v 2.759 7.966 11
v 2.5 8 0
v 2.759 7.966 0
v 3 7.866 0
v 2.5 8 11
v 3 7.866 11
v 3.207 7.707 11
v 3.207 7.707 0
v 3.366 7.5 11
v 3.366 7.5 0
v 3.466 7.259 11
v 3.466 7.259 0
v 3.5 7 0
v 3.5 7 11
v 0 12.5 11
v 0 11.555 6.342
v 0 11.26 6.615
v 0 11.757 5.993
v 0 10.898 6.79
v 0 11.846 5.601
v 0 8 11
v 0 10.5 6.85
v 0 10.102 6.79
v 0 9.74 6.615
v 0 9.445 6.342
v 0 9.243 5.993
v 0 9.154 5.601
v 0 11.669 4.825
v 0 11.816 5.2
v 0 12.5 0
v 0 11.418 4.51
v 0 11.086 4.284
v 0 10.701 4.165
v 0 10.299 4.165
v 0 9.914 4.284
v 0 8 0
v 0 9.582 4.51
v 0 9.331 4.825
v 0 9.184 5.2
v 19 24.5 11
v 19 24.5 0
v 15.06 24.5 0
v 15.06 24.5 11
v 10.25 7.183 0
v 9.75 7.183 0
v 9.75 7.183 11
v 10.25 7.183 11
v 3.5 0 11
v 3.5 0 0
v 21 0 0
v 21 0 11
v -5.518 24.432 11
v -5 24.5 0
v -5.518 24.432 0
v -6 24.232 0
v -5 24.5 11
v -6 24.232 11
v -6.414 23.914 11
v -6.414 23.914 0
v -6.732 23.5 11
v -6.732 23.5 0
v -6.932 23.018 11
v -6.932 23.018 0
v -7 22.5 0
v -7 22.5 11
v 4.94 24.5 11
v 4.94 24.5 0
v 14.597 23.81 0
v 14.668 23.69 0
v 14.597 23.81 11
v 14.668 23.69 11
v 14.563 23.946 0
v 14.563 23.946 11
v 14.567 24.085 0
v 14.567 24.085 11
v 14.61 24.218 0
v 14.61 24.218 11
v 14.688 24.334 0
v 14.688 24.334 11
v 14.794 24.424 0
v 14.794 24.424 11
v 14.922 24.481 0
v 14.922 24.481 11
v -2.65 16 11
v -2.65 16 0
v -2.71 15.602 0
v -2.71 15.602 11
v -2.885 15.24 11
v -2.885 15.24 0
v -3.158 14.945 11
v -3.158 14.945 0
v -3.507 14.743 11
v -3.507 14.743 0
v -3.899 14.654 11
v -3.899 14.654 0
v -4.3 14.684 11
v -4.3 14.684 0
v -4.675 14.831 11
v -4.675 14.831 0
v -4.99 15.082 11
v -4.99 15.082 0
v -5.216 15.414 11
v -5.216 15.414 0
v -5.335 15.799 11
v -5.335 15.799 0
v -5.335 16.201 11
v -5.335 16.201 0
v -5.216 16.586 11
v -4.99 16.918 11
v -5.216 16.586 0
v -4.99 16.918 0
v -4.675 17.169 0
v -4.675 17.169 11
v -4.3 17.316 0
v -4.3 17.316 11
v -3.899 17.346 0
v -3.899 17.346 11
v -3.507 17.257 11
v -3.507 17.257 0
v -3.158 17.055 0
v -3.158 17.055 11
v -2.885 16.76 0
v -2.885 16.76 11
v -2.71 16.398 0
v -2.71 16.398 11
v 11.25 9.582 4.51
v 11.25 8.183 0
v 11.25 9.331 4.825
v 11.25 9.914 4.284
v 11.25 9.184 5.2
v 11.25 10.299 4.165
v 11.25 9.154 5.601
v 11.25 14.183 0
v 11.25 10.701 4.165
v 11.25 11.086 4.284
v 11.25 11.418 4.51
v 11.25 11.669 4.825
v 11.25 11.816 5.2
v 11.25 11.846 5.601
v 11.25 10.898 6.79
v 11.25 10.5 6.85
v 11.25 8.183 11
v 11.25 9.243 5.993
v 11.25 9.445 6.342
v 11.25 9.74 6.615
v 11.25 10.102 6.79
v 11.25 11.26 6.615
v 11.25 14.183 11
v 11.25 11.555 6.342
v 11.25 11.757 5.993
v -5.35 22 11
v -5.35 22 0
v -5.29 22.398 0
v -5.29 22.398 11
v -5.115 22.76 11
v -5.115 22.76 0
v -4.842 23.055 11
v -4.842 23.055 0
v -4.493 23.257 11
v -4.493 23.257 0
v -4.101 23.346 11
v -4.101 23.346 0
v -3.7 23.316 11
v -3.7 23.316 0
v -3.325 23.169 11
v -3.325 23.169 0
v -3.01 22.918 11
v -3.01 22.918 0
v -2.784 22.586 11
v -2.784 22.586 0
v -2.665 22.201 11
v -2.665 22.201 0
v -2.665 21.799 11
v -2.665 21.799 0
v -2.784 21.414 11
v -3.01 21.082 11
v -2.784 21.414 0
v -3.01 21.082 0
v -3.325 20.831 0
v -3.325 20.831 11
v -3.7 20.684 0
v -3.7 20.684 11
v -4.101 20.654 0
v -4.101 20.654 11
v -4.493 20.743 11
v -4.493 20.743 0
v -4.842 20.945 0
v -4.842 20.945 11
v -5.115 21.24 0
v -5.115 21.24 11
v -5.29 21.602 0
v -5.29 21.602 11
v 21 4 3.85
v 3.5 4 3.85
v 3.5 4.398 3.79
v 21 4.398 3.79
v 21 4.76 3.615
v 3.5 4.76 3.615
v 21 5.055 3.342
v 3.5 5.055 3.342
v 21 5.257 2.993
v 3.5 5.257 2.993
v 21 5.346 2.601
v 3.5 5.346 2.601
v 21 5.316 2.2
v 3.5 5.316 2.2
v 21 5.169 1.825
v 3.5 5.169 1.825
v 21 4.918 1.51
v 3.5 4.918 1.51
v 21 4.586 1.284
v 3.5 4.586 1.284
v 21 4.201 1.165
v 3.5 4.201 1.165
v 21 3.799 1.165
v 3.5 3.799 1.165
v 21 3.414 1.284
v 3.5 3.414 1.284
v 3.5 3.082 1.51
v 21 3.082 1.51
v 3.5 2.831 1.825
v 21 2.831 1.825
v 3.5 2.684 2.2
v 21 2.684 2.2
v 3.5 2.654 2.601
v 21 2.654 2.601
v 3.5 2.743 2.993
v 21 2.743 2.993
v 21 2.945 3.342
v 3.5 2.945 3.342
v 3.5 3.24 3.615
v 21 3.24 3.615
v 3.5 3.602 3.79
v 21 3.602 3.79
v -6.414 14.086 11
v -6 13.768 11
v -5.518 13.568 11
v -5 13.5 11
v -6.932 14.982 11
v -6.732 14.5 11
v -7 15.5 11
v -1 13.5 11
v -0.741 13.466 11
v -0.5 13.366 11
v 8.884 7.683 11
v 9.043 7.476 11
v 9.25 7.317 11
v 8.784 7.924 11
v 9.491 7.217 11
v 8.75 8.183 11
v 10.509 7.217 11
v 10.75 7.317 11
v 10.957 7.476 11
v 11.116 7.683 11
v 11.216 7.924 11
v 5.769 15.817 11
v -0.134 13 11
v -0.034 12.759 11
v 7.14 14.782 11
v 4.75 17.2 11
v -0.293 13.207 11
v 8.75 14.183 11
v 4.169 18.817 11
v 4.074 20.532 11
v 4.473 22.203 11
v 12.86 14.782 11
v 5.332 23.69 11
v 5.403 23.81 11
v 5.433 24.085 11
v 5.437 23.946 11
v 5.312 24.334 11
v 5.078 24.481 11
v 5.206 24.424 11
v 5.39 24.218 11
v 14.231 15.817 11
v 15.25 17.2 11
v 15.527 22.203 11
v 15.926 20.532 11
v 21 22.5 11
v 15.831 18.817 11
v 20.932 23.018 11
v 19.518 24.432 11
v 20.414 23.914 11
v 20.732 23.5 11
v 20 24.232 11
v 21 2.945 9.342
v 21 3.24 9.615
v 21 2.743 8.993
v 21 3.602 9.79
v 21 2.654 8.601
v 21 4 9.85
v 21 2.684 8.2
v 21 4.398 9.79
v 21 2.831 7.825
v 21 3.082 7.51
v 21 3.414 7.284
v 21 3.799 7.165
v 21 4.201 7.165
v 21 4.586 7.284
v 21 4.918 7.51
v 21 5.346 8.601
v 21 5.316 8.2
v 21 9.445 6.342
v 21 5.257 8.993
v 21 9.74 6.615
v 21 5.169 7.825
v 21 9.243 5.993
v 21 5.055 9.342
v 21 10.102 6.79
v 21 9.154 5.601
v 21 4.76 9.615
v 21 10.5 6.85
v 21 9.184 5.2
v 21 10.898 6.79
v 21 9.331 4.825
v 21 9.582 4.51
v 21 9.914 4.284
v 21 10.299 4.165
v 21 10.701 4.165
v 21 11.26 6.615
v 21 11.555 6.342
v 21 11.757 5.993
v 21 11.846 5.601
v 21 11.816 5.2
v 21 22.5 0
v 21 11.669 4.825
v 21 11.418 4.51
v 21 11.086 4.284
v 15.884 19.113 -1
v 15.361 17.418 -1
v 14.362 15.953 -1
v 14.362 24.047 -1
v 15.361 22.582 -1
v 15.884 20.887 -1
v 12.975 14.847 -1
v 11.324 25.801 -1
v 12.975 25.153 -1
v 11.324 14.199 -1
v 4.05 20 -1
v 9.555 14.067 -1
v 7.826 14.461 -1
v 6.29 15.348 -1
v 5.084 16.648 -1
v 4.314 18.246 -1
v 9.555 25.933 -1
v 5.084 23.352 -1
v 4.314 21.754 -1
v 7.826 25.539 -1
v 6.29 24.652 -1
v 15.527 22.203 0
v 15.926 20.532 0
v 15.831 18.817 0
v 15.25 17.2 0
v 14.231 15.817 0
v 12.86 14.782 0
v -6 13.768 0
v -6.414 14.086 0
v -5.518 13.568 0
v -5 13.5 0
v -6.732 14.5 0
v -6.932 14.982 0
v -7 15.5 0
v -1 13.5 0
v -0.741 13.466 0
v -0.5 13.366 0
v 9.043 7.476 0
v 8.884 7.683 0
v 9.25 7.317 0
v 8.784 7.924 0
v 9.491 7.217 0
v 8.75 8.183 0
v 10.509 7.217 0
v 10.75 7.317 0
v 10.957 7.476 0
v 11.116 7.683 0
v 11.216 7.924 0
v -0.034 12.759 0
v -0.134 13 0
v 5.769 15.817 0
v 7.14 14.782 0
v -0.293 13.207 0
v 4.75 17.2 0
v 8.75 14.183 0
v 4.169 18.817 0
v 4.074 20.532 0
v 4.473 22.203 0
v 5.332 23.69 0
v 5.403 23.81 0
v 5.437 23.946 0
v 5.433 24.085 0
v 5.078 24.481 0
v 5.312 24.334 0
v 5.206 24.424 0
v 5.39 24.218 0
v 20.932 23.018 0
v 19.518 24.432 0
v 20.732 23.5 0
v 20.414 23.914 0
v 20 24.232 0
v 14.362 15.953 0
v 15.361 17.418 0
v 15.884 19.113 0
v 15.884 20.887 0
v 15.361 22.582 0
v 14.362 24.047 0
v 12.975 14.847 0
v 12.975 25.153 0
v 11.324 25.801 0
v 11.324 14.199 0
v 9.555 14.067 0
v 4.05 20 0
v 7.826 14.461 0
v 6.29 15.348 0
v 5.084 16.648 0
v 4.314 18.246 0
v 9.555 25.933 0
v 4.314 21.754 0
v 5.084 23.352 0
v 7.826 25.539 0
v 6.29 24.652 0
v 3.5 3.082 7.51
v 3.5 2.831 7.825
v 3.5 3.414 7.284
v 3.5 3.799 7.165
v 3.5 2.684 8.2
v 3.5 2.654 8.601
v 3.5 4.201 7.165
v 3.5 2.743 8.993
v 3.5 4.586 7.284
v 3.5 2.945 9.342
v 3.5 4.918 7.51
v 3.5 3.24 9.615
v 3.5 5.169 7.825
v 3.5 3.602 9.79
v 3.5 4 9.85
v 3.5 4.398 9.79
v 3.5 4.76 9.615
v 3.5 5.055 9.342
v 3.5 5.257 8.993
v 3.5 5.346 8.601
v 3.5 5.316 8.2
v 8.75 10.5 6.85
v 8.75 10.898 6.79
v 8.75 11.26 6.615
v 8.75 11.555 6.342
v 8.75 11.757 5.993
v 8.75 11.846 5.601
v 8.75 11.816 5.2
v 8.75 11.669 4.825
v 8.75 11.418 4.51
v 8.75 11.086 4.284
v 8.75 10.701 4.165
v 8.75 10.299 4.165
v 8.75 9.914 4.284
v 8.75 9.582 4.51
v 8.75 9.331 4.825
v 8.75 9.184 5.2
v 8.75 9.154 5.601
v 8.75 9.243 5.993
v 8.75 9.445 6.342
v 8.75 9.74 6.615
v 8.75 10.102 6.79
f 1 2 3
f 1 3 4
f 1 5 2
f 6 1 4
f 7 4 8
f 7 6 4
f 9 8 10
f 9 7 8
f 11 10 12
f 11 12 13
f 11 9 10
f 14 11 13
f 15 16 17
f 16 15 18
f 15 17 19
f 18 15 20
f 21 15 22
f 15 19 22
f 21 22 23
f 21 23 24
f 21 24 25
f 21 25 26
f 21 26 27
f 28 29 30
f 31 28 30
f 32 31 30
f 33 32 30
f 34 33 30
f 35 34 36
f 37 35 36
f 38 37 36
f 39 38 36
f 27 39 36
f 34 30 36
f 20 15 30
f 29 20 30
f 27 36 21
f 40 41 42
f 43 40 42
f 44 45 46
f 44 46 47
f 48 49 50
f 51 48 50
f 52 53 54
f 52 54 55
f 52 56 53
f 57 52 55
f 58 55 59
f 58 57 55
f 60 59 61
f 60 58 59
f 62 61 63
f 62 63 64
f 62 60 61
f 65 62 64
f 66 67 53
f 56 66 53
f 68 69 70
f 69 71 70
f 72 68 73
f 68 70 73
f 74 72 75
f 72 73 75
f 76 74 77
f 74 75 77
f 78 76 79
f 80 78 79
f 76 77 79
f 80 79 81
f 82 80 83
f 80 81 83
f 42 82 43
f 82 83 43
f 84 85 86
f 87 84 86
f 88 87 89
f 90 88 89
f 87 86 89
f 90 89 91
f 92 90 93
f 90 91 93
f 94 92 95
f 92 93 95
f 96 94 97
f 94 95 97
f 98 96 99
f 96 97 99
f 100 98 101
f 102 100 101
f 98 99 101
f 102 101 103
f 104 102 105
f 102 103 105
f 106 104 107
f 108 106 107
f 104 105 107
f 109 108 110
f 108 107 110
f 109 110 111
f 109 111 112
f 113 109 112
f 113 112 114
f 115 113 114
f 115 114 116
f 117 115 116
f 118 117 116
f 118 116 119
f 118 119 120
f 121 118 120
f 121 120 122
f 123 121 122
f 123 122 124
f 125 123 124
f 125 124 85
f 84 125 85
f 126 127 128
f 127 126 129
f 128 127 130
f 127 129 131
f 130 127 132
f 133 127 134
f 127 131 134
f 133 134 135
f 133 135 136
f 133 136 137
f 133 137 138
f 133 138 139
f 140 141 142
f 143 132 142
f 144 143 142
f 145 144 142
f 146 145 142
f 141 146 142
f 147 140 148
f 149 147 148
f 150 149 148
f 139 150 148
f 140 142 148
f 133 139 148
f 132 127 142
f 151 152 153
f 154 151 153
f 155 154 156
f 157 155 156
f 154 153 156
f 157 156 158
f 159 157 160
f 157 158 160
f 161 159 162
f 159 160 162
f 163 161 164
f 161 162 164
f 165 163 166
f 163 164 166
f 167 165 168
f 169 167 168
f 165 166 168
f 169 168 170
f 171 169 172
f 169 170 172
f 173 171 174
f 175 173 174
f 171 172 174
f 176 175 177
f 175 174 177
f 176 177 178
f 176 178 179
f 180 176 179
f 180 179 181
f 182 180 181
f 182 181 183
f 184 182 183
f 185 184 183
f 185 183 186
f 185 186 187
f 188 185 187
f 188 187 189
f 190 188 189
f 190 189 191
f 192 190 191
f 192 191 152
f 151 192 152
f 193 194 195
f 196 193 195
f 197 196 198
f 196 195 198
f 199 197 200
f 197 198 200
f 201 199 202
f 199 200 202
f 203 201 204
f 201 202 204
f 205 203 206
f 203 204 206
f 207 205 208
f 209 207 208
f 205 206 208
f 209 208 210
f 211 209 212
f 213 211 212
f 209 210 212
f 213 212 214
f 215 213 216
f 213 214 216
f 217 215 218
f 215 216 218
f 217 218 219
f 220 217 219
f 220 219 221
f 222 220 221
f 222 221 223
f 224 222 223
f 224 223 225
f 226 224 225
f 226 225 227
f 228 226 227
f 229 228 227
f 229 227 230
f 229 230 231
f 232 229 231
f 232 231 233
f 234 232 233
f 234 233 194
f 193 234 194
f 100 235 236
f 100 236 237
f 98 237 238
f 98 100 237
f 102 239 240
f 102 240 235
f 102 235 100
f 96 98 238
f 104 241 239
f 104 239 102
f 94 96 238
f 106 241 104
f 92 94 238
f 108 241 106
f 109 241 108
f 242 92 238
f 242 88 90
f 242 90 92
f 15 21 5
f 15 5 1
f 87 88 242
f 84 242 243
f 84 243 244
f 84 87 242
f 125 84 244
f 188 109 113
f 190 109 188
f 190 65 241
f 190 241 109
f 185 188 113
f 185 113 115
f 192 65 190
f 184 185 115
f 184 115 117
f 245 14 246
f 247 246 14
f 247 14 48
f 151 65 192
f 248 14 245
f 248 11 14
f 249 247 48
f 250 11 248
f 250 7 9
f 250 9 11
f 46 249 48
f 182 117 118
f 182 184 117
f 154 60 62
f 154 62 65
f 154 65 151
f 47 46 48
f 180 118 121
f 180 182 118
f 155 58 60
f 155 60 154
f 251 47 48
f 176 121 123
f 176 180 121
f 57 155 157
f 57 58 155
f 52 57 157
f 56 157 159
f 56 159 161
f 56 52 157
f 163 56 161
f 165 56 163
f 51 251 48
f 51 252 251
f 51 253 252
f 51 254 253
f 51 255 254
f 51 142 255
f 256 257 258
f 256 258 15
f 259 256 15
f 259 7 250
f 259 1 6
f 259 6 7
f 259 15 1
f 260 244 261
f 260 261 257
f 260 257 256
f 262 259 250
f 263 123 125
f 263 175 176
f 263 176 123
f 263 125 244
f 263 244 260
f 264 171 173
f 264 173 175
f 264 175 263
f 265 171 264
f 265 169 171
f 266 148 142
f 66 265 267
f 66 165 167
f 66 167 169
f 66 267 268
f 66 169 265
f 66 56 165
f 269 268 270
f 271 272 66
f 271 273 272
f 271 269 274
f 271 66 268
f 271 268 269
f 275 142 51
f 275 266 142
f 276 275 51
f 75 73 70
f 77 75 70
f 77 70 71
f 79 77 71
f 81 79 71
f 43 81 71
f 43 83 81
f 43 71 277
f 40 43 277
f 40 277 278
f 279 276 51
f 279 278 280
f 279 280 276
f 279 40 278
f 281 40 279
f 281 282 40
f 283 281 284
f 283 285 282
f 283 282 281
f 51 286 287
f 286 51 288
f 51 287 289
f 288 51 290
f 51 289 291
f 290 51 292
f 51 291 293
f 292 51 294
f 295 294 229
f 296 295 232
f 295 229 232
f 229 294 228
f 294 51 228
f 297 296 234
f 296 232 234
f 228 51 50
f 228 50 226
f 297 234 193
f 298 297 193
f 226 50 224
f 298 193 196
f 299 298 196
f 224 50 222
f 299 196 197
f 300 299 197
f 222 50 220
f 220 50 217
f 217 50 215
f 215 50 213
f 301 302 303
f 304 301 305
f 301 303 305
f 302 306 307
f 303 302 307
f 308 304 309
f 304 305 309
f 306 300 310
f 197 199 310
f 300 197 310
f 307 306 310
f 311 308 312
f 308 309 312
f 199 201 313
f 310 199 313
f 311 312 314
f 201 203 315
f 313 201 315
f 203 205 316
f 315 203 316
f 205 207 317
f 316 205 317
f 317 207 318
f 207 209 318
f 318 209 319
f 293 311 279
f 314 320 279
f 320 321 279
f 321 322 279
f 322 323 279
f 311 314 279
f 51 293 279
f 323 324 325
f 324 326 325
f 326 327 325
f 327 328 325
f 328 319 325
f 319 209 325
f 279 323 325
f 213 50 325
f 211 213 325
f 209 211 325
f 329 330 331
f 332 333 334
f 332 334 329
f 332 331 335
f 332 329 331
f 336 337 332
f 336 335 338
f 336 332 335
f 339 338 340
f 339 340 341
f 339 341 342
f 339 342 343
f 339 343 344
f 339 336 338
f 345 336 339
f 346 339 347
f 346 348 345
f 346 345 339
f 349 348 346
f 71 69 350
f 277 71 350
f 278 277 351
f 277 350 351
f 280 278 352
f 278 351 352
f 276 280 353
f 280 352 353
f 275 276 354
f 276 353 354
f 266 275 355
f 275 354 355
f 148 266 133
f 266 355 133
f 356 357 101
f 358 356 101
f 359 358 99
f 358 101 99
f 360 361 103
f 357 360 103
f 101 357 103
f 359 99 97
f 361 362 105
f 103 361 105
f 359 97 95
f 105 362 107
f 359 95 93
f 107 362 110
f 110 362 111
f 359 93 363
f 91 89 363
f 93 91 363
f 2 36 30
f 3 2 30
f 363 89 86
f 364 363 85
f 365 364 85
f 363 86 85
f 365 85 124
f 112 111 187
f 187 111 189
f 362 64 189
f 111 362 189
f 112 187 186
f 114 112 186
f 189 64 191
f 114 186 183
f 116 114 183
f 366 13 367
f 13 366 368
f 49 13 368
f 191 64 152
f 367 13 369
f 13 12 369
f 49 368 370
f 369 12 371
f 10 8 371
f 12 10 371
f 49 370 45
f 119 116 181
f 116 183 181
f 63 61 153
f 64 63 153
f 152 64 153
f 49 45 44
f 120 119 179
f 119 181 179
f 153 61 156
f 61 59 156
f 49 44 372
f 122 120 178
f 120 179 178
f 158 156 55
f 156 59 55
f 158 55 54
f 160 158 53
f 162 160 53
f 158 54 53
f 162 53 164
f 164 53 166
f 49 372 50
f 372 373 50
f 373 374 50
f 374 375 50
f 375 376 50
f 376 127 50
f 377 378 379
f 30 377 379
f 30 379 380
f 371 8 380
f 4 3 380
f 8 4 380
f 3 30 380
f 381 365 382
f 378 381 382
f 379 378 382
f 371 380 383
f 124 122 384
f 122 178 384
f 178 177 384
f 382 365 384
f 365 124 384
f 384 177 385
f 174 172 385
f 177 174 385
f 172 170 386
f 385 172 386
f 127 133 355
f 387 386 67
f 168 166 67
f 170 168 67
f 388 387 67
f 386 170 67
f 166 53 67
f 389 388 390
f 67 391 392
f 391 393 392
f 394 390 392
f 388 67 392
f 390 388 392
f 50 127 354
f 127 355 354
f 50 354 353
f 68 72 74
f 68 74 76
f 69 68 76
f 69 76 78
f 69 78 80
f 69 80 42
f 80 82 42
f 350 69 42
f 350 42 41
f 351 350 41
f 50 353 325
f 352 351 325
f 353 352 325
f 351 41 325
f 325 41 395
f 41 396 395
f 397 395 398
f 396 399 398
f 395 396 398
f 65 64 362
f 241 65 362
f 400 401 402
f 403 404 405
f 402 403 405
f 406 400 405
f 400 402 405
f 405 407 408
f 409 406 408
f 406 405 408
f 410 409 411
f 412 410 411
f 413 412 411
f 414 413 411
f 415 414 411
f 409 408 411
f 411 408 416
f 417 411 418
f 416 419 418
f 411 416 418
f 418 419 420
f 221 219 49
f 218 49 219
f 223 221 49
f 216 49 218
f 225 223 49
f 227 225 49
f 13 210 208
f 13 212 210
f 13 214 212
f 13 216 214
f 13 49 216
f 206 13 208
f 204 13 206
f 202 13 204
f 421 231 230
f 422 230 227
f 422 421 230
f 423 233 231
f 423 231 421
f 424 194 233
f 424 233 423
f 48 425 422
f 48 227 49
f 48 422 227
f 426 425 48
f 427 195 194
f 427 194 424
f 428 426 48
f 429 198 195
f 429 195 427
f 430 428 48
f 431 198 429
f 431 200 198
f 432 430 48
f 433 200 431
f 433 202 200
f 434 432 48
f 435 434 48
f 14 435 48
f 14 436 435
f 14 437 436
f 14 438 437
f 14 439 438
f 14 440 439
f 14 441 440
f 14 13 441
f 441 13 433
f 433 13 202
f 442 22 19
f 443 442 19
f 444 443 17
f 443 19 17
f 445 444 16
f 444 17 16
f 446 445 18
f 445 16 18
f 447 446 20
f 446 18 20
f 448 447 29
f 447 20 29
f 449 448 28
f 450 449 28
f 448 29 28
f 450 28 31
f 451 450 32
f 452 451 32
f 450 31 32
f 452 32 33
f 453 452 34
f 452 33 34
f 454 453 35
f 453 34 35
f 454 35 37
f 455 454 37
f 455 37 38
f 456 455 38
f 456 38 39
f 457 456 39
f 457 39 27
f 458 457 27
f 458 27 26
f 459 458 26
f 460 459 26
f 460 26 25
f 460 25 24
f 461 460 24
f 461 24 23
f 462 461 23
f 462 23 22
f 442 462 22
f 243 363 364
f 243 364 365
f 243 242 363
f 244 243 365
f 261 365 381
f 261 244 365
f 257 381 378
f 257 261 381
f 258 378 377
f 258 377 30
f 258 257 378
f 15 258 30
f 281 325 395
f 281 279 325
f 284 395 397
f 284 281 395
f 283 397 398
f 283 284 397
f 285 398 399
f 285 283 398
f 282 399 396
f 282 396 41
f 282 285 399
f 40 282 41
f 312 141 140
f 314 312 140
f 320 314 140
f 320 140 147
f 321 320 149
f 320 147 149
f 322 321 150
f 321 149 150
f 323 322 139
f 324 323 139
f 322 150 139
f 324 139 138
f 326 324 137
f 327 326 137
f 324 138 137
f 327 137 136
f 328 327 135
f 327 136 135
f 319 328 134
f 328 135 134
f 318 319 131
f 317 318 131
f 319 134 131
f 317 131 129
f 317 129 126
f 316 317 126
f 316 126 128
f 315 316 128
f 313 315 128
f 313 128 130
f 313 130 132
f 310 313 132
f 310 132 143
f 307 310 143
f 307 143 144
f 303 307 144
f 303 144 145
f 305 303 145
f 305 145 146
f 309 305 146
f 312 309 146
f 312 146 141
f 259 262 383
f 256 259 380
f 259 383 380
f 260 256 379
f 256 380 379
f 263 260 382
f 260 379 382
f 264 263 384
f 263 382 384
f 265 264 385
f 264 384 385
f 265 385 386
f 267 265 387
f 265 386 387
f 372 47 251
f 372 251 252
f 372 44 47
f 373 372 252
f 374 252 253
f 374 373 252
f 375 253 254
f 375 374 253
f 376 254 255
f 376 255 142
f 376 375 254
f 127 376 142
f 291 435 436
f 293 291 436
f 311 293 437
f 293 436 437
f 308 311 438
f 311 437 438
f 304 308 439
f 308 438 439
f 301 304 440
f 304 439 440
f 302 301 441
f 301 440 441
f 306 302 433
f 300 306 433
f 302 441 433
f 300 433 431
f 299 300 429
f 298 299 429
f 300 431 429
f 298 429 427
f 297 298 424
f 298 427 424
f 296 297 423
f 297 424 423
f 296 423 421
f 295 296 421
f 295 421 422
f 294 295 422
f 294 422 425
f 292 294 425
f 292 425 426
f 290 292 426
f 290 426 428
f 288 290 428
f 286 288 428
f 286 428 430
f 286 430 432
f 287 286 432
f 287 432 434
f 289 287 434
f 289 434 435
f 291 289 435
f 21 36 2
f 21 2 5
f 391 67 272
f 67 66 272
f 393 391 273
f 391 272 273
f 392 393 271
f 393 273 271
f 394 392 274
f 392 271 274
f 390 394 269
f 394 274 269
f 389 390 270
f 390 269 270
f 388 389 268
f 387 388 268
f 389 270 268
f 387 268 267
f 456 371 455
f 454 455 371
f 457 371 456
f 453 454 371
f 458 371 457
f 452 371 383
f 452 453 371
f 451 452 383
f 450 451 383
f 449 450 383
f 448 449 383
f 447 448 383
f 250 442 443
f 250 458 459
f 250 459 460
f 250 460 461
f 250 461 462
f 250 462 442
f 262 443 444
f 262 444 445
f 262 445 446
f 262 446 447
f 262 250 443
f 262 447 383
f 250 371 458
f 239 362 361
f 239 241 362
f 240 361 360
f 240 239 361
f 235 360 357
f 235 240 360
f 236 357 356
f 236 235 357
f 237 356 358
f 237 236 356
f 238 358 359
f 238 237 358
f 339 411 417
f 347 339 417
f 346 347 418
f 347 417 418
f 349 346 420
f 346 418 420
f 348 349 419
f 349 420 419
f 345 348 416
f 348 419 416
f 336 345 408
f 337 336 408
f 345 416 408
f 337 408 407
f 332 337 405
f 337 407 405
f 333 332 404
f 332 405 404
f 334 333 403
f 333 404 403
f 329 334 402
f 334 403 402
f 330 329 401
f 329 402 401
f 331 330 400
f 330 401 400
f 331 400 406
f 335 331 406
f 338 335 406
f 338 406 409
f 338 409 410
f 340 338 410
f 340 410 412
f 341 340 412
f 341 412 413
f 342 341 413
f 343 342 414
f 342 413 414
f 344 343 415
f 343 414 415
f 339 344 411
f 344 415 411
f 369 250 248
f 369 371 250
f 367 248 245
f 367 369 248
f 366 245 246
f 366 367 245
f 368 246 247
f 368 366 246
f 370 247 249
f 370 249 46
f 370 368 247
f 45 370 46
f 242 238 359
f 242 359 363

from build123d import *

# Parameters (mm, degrees)
EXTRUDE_1_DEPTH     = 11
SKETCH_6_W          = 2.5
SKETCH_6_H          = 7
CUT_EXTRUDE_2_DEPTH = 35.091787867
SKETCH_2_R          = 1.35
CUT_EXTRUDE_1_DEPTH = 35.091787867
SKETCH_9_R          = 1.35
CUT_EXTRUDE_3_DEPTH = 35.091787867
SKETCH_7_R          = 5.95
EXTRUDE_3_DEPTH     = 1
SKETCH_10_W         = 11
SKETCH_10_H         = 8
CUT_EXTRUDE_4_DEPTH = 3.5
FILLET_2_R          = 0.5
FILLET_1_R          = 2
FILLET_3_R          = 1


with BuildPart() as part:
    # 草图1 → 凸台-拉伸1 (new body)
    with BuildSketch(Plane.XY):
        with BuildLine():
            Line((0, 0), (21, 0))
            Line((21, 0), (21, 24.5))
            Line((21, 24.5), (13.892621225, 24.5))
            ThreePointArc((13.892621225, 24.5), (10, 14.05), (6.107378775, 24.5))
            Line((6.107378775, 24.5), (0, 24.5))
            Line((0, 24.5), (-7, 24.5))
            Line((-7, 24.5), (-7, 13.5))
            Line((-7, 13.5), (0, 13.5))
            Line((0, 13.5), (0, 0))
        make_face()
    extrude(amount=EXTRUDE_1_DEPTH)

    # 草图6 → 切除-拉伸2 (cut, through all)
    with BuildSketch(Plane.XY.offset(11)):
        with Locations((10, 10.682784171)):
            Rectangle(SKETCH_6_W, SKETCH_6_H)
    extrude(amount=-CUT_EXTRUDE_2_DEPTH, mode=Mode.SUBTRACT)

    # 草图2 → 切除-拉伸1 (cut, through all)
    with BuildSketch(Plane.ZY):
        with Locations((5.5, 10.5)):
            Circle(SKETCH_2_R)
        with Locations((8.5, 4)):
            Circle(SKETCH_2_R)
        with Locations((2.5, 4)):
            Circle(SKETCH_2_R)
    extrude(amount=-CUT_EXTRUDE_1_DEPTH, mode=Mode.SUBTRACT)

    # 草图9 → 切除-拉伸3 (cut, through all)
    with BuildSketch(Plane(origin=(0, 0, 0), x_dir=(-1, 0, 0), z_dir=(0, 0, -1))):
        with Locations((4, 22)):
            Circle(SKETCH_9_R)
        with Locations(Location((4, 16, 0), (0, 0, 180))):
            Circle(SKETCH_9_R)
    extrude(amount=-CUT_EXTRUDE_3_DEPTH, mode=Mode.SUBTRACT)

    # 草图10 → 切除-拉伸4 (cut)
    with BuildSketch(Plane.ZY):
        with Locations((5.5, 4)):
            Rectangle(SKETCH_10_W, SKETCH_10_H)
    extrude(amount=-CUT_EXTRUDE_4_DEPTH, mode=Mode.SUBTRACT)

    # 圆角2
    fillet_2_edges = [part.edges().sort_by_distance(p)[0] for p in [
        (6.107378775, 24.5, 5.5),
        (13.892621225, 24.5, 5.5),
    ]]
    fillet(fillet_2_edges, radius=FILLET_2_R)

    # 圆角1
    fillet_1_edges = [part.edges().sort_by_distance(p)[0] for p in [
        (-7, 13.5, 5.5),
        (-7, 24.5, 5.5),
        (21, 24.5, 5.5),
    ]]
    fillet(fillet_1_edges, radius=FILLET_1_R)

    # 圆角3
    fillet_3_edges = [part.edges().sort_by_distance(p)[0] for p in [
        (0, 13.5, 5.5),
        (11.25, 7.182784171, 5.5),
        (8.75, 7.182784171, 5.5),
        (3.5, 8, 5.5),
    ]]
    fillet(fillet_3_edges, radius=FILLET_3_R)


with BuildPart() as body_2:
    # 草图7 → 凸台-拉伸3 (new body)
    with BuildSketch(Plane(origin=(0, 0, 0), x_dir=(-1, 0, 0), z_dir=(0, 0, -1))):
        with Locations((-10, 20)):
            Circle(SKETCH_7_R)
    extrude(amount=EXTRUDE_3_DEPTH)


solid = Compound([part.part, body_2.part])
